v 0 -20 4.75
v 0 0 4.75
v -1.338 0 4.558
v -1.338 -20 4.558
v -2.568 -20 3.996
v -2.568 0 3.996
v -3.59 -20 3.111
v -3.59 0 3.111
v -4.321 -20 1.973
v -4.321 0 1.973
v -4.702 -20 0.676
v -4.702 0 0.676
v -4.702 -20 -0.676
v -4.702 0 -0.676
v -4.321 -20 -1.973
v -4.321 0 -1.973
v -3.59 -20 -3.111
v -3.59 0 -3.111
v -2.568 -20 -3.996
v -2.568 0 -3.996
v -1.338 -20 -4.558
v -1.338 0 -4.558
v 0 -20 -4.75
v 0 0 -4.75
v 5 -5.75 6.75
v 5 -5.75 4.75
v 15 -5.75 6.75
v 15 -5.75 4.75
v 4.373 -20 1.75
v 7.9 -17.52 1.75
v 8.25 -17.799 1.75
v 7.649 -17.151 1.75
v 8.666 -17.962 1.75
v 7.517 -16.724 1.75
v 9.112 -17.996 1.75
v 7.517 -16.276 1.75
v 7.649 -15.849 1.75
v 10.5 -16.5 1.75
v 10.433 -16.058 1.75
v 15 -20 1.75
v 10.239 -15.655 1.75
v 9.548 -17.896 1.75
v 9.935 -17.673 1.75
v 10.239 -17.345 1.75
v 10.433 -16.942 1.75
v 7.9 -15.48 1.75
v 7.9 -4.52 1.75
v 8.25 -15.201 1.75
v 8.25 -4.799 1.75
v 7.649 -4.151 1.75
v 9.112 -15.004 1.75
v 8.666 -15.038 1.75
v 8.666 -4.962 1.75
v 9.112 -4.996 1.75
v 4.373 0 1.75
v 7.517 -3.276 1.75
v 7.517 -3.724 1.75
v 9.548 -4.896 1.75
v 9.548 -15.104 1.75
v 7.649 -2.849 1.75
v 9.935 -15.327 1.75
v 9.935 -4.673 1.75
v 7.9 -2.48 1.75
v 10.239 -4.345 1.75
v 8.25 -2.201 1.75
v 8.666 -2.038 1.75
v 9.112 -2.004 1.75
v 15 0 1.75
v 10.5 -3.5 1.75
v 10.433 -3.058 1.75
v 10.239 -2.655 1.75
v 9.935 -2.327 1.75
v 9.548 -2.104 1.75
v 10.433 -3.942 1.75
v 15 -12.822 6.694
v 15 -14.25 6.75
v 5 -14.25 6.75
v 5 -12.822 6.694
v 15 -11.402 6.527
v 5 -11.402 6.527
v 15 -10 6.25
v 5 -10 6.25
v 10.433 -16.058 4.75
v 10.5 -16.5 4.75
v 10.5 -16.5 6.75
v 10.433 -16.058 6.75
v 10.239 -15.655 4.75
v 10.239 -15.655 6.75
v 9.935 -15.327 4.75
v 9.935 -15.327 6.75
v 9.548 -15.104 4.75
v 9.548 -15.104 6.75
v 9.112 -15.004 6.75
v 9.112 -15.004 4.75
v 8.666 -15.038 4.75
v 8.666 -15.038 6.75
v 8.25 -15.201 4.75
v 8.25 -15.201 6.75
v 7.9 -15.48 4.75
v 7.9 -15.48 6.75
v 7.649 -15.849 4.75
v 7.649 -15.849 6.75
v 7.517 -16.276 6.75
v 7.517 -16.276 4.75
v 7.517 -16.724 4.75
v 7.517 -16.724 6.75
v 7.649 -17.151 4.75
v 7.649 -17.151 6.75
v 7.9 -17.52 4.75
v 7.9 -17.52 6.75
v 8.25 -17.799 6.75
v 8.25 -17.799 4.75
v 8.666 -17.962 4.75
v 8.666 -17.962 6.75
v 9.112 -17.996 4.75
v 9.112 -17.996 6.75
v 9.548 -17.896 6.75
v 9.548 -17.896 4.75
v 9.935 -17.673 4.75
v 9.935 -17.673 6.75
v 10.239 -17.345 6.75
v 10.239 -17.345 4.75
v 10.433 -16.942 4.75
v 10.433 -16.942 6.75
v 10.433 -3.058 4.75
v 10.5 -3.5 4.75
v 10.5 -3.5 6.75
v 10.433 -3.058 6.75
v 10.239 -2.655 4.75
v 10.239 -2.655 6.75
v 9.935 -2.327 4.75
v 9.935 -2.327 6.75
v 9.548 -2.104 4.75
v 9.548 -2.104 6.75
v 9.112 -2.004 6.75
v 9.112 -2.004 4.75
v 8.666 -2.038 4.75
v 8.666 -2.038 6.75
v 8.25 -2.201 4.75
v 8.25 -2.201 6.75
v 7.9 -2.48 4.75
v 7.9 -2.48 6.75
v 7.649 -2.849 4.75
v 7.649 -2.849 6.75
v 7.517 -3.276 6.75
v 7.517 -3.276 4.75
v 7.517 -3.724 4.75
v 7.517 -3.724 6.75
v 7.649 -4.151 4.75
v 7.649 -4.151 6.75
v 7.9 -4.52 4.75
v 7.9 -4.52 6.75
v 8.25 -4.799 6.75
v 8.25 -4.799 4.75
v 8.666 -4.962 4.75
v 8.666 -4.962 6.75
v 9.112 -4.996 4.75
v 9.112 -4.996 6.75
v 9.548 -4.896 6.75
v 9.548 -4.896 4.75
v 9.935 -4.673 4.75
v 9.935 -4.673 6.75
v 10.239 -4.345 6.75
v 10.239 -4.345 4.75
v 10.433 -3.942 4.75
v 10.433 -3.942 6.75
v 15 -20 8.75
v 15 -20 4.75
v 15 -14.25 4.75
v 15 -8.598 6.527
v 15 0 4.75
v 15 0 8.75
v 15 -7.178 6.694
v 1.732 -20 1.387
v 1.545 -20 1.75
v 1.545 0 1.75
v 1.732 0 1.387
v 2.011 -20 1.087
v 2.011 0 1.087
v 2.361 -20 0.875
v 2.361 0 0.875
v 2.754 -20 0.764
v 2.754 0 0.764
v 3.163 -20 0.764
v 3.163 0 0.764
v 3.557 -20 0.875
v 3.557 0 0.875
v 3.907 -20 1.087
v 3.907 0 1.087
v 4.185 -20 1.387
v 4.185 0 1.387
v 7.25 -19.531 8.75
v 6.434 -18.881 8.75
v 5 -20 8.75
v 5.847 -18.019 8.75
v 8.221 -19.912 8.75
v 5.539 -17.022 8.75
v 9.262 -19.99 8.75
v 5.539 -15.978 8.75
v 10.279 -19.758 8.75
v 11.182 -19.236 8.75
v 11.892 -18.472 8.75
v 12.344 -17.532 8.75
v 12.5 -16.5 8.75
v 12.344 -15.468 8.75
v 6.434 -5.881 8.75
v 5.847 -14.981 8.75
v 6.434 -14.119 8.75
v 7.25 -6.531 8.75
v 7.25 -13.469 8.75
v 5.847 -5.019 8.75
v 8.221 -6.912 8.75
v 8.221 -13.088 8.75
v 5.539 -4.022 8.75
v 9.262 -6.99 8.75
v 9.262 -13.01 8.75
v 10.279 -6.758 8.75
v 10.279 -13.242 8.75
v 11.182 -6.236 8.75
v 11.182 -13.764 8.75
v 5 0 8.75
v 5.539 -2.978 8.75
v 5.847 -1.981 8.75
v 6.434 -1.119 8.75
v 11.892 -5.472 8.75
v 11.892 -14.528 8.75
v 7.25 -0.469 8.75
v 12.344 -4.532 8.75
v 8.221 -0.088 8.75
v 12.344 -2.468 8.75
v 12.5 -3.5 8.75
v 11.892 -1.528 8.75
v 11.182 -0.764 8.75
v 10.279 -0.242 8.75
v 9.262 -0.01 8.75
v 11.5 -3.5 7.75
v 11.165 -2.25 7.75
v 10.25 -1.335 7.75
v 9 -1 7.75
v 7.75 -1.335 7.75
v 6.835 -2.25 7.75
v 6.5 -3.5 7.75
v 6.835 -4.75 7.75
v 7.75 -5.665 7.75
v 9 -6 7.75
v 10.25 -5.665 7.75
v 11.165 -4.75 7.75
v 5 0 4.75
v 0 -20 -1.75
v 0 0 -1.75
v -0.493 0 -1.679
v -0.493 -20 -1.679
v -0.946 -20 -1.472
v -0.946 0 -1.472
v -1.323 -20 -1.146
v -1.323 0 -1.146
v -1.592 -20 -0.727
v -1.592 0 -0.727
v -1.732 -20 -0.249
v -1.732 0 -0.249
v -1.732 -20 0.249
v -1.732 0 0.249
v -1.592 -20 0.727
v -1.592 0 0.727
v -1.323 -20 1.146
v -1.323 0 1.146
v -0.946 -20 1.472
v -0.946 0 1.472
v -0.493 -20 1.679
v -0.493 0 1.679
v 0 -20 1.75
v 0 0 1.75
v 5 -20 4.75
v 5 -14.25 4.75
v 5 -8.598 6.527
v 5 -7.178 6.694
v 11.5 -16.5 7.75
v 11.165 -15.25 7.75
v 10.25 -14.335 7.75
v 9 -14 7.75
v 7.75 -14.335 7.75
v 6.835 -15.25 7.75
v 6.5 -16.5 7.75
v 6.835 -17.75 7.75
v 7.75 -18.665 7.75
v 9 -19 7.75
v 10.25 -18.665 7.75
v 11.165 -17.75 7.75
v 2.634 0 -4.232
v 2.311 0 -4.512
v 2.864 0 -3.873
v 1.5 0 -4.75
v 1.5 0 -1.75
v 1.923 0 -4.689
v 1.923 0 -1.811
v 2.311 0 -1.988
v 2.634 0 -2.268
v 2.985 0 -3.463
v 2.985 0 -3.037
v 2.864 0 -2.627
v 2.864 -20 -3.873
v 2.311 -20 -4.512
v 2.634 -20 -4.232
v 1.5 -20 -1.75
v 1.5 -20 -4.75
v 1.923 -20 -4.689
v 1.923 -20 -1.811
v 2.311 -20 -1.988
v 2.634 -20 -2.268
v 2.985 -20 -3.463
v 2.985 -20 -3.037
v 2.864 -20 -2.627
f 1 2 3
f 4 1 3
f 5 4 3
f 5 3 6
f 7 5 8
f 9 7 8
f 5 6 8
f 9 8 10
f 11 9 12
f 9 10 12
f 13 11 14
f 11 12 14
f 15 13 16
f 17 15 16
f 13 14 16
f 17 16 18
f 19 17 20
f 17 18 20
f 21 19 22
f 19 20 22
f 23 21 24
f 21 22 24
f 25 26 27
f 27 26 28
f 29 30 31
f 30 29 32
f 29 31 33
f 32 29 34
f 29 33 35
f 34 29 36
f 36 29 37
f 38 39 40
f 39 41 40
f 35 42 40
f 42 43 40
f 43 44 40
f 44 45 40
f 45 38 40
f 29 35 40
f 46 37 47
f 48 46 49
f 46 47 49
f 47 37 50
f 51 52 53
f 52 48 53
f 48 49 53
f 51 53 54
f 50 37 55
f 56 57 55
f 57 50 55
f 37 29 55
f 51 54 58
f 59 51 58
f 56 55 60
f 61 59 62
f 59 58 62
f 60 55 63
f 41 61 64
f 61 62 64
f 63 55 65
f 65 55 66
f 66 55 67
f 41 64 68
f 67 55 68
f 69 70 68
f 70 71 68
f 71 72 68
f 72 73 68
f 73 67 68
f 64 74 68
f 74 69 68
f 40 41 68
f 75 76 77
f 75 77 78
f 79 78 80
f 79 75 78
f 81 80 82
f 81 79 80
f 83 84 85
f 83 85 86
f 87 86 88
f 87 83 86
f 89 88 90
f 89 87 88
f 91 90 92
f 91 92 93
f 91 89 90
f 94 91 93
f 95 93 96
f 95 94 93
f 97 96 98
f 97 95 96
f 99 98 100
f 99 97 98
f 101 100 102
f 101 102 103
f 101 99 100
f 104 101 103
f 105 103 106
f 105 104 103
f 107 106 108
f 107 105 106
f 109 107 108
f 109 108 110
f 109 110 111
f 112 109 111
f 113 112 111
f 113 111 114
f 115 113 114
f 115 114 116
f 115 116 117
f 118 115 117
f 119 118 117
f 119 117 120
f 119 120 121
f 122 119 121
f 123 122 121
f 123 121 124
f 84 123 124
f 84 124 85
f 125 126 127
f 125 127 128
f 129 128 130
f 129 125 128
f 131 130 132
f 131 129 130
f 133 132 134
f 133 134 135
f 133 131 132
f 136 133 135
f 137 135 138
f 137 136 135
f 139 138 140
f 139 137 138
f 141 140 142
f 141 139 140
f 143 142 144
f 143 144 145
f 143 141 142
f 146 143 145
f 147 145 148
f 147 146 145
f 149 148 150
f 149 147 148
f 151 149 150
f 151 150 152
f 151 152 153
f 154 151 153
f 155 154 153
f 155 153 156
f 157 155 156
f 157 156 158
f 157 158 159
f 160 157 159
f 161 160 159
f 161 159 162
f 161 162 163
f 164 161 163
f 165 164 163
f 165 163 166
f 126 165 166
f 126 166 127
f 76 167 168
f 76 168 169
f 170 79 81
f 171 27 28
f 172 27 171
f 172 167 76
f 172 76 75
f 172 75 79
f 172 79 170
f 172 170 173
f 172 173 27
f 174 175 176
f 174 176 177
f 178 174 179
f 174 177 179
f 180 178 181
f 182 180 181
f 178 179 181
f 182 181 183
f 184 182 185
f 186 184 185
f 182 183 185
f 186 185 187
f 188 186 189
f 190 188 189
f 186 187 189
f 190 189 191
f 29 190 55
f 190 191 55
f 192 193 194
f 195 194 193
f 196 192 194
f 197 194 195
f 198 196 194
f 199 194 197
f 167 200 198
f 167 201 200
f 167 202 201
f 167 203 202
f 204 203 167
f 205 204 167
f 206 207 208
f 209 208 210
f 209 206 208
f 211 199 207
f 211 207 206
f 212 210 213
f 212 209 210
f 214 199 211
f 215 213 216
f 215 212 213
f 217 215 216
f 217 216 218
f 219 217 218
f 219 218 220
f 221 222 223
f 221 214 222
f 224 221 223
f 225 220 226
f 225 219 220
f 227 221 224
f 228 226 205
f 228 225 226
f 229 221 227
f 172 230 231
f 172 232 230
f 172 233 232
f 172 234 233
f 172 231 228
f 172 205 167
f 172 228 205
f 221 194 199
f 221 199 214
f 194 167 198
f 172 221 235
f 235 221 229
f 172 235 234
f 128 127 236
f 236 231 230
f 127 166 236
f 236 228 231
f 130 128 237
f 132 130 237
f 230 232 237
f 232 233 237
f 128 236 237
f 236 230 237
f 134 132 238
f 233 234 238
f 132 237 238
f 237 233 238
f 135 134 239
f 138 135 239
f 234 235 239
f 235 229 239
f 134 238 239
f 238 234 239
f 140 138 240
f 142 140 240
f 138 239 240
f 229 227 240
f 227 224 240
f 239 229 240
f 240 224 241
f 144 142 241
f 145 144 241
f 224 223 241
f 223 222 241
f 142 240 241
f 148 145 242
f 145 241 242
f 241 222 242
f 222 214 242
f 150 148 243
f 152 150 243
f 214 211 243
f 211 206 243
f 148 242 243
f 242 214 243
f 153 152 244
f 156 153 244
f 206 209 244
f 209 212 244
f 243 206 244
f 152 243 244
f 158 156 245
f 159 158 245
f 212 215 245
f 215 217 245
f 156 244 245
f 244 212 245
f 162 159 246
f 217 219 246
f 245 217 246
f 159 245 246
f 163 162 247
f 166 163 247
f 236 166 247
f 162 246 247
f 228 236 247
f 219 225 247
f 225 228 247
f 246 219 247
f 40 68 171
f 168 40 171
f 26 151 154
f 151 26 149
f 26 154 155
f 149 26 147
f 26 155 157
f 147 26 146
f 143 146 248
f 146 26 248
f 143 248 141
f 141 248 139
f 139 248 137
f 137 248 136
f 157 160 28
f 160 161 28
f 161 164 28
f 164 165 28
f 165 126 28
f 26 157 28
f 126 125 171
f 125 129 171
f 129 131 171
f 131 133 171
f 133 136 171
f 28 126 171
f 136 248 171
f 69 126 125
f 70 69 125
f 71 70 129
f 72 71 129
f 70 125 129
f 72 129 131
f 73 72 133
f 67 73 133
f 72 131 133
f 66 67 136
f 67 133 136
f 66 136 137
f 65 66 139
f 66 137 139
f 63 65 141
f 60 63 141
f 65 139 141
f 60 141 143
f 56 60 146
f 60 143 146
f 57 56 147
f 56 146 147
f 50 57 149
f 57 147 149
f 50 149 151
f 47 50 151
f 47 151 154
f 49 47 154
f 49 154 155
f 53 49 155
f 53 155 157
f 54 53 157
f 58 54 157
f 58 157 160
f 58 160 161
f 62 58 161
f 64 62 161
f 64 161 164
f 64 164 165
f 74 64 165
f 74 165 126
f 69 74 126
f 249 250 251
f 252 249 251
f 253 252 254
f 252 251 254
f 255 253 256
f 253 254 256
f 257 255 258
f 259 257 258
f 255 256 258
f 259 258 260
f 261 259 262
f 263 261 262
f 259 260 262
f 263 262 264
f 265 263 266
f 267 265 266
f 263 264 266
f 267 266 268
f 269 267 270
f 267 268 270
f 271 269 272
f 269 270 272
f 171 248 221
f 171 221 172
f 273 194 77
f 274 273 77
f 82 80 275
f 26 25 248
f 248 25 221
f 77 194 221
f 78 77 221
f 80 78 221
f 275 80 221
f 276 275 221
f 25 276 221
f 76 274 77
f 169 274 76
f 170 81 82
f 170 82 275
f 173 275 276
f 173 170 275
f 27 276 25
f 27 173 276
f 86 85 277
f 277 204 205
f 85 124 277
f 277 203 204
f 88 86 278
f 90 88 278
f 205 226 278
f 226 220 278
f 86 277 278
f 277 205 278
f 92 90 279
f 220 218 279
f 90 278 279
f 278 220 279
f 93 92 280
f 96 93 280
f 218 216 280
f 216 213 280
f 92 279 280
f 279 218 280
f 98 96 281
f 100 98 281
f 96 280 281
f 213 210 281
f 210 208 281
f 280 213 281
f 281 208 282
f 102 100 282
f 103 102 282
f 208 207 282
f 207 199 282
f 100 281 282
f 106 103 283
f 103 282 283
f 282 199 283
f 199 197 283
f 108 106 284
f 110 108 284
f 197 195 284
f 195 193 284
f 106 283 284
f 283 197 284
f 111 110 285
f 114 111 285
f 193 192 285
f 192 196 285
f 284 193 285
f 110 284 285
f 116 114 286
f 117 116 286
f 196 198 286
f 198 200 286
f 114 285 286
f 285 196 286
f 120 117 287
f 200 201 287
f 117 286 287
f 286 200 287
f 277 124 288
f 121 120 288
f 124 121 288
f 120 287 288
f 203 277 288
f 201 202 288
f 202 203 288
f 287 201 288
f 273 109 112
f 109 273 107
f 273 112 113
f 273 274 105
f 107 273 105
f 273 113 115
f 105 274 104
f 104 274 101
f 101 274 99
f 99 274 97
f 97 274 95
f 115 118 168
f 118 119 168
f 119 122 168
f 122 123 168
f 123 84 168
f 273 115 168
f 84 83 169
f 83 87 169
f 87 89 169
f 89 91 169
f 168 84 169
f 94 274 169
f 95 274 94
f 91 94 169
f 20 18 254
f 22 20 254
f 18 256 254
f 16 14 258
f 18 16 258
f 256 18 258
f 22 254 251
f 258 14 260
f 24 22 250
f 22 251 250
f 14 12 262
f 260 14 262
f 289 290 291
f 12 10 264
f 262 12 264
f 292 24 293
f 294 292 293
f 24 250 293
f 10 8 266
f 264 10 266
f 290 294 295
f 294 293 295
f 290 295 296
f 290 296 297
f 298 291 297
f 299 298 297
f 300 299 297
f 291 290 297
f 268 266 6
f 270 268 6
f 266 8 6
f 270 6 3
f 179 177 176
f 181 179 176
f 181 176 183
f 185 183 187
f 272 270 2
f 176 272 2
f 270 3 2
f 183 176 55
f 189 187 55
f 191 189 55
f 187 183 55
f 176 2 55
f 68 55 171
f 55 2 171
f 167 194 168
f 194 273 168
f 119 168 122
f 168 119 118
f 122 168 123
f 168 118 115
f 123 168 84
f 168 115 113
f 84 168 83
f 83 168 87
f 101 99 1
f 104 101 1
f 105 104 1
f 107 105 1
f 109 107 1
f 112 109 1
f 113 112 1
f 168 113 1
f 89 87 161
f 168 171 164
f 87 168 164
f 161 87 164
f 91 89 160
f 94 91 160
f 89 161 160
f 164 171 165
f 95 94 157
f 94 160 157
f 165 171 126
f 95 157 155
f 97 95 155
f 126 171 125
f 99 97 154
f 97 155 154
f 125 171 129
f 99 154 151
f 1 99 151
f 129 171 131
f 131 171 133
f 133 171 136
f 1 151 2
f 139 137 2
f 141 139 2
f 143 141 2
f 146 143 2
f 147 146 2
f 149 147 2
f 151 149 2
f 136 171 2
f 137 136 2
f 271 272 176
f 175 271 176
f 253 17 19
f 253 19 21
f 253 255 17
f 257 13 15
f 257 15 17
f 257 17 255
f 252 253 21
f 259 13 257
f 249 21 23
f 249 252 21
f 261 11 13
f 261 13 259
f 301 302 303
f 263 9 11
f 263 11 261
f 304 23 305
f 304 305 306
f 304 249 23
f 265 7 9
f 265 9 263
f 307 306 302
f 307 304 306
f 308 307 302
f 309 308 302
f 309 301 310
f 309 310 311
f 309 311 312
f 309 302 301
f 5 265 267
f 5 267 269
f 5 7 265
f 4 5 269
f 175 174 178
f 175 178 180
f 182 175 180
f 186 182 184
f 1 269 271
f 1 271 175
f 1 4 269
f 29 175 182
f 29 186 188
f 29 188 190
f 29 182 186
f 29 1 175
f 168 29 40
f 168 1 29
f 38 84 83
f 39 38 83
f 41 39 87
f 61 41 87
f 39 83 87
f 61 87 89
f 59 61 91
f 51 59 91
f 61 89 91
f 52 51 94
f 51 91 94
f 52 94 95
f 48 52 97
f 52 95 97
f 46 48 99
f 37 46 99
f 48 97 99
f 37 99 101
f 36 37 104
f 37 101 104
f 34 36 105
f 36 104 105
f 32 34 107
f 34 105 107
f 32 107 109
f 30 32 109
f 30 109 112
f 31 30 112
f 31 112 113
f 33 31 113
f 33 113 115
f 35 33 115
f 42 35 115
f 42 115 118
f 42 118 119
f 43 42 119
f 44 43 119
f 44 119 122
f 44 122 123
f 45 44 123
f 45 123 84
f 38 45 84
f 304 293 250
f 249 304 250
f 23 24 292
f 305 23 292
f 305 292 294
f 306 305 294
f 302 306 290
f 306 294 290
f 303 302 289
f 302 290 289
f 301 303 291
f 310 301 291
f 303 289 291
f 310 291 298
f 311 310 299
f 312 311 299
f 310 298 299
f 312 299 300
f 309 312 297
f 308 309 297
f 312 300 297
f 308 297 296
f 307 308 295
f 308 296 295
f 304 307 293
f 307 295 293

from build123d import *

# Parameters (mm, degrees)
F1_DEPTH  = 20
F2_R      = 1.5
F3_DEPTH  = 9.501
F4_W      = 10
F4_H      = 5.75
F4_R      = 1.5
F5_DEPTH  = 2
F6_W      = 10
F6_H      = 5.75
F6_R      = 1.5
F6_H_2    = 14.25
F7_DEPTH  = 2
F8_SIZE   = 1.99999
F10_DEPTH = 10


# Not quite as in the source:
# - a fillet or chamfer is up to 0.001 mm smaller than in the source, because OpenCascade refuses the exact size


with BuildPart() as f1:
    # F0 (on Front) → F1 (new body)
    with BuildSketch(Plane.XZ):
        with BuildLine():
            ThreePointArc((0, -1.75), (-1.75, 0), (0, 1.75))
            Line((0, 1.75), (1.5446865, 1.75))
            Line((1.5446865, 1.75), (4.3731136247, 1.75))
            Line((4.3731136247, 1.75), (15, 1.75))
            Line((15, 1.75), (15, 4.75))
            Line((15, 4.75), (0, 4.75))
            ThreePointArc((0, 4.75), (-4.75, 0), (0, -4.75))
            Line((0, -4.75), (1.5, -4.75))
            ThreePointArc((1.5, -4.75), (3, -3.25), (1.5, -1.75))
            Line((1.5, -1.75), (0, -1.75))
        make_face()
        with BuildLine():
            Line((4.3731136247, 1.75), (1.5446865, 1.75))
            ThreePointArc((1.5446865, 1.75), (2.9589000624, 0.75), (4.3731136247, 1.75))
        make_face()
    extrude(amount=F1_DEPTH)

    # F2 (on face) → F3 (cut, through all)
    with BuildSketch(Plane.XY.offset(4.75)):
        with Locations((9, -3.5)):
            Circle(F2_R)
        with Locations((9, -16.5)):
            Circle(F2_R)
    extrude(amount=-F3_DEPTH, mode=Mode.SUBTRACT)


with BuildPart() as f5:
    # F4 (on face) → F5 (new body)
    with BuildSketch(Plane.XY.offset(4.75)):
        with Locations((10, -2.875)):
            Rectangle(F4_W, F4_H)
        with Locations((9, -3.5)):
            Circle(F4_R, mode=Mode.SUBTRACT)
    extrude(amount=F5_DEPTH)



with BuildPart() as f5b:
    # F4 (on face) → F5, piece 2 (new body)
    with BuildSketch(Plane.XY.offset(4.75)):
        with Locations((10, -17.125)):
            Rectangle(F4_W, F4_H)
        with Locations((9, -16.5)):
            Circle(F4_R, mode=Mode.SUBTRACT)
    extrude(amount=F5_DEPTH)


with BuildPart() as f5_1:
    add(f5.part)

    add(f5b.part)  # F7 merges F5b
    # F6 (on face) → F7 (join)
    with BuildSketch(Plane.XY.offset(6.75)):
        with Locations((10, -2.875)):
            Rectangle(F6_W, F6_H)
        with Locations((9, -3.5)):
            Circle(F6_R, mode=Mode.SUBTRACT)
        with Locations((10, -12.875)):
            Rectangle(F6_W, F6_H_2)
        with Locations((9, -16.5)):
            Circle(F6_R, mode=Mode.SUBTRACT)
    extrude(amount=F7_DEPTH)

    # F8 (size 2 in the source; OpenCascade refuses exactly that, so slightly less here)
    f8_edges = [f5_1.edges().sort_by_distance(p)[0] for p in [
        (7.5, -16.5, 8.75),
        (7.5, -3.5, 8.75),
    ]]
    chamfer(f8_edges, length=F8_SIZE)

    # F9 (on face) → F10 (join, through all)
    with BuildSketch(Plane.YZ.offset(15)):
        with BuildLine():
            Line((-5.75, 6.75), (-14.25, 6.75))
            ThreePointArc((-14.25, 6.75), (-12.1103446539, 6.6245704417), (-10, 6.25))
            ThreePointArc((-10, 6.25), (-7.8896553461, 6.6245704417), (-5.75, 6.75))
        make_face()
    extrude(amount=-F10_DEPTH)


solid = Compound([f1.part, f5_1.part])
